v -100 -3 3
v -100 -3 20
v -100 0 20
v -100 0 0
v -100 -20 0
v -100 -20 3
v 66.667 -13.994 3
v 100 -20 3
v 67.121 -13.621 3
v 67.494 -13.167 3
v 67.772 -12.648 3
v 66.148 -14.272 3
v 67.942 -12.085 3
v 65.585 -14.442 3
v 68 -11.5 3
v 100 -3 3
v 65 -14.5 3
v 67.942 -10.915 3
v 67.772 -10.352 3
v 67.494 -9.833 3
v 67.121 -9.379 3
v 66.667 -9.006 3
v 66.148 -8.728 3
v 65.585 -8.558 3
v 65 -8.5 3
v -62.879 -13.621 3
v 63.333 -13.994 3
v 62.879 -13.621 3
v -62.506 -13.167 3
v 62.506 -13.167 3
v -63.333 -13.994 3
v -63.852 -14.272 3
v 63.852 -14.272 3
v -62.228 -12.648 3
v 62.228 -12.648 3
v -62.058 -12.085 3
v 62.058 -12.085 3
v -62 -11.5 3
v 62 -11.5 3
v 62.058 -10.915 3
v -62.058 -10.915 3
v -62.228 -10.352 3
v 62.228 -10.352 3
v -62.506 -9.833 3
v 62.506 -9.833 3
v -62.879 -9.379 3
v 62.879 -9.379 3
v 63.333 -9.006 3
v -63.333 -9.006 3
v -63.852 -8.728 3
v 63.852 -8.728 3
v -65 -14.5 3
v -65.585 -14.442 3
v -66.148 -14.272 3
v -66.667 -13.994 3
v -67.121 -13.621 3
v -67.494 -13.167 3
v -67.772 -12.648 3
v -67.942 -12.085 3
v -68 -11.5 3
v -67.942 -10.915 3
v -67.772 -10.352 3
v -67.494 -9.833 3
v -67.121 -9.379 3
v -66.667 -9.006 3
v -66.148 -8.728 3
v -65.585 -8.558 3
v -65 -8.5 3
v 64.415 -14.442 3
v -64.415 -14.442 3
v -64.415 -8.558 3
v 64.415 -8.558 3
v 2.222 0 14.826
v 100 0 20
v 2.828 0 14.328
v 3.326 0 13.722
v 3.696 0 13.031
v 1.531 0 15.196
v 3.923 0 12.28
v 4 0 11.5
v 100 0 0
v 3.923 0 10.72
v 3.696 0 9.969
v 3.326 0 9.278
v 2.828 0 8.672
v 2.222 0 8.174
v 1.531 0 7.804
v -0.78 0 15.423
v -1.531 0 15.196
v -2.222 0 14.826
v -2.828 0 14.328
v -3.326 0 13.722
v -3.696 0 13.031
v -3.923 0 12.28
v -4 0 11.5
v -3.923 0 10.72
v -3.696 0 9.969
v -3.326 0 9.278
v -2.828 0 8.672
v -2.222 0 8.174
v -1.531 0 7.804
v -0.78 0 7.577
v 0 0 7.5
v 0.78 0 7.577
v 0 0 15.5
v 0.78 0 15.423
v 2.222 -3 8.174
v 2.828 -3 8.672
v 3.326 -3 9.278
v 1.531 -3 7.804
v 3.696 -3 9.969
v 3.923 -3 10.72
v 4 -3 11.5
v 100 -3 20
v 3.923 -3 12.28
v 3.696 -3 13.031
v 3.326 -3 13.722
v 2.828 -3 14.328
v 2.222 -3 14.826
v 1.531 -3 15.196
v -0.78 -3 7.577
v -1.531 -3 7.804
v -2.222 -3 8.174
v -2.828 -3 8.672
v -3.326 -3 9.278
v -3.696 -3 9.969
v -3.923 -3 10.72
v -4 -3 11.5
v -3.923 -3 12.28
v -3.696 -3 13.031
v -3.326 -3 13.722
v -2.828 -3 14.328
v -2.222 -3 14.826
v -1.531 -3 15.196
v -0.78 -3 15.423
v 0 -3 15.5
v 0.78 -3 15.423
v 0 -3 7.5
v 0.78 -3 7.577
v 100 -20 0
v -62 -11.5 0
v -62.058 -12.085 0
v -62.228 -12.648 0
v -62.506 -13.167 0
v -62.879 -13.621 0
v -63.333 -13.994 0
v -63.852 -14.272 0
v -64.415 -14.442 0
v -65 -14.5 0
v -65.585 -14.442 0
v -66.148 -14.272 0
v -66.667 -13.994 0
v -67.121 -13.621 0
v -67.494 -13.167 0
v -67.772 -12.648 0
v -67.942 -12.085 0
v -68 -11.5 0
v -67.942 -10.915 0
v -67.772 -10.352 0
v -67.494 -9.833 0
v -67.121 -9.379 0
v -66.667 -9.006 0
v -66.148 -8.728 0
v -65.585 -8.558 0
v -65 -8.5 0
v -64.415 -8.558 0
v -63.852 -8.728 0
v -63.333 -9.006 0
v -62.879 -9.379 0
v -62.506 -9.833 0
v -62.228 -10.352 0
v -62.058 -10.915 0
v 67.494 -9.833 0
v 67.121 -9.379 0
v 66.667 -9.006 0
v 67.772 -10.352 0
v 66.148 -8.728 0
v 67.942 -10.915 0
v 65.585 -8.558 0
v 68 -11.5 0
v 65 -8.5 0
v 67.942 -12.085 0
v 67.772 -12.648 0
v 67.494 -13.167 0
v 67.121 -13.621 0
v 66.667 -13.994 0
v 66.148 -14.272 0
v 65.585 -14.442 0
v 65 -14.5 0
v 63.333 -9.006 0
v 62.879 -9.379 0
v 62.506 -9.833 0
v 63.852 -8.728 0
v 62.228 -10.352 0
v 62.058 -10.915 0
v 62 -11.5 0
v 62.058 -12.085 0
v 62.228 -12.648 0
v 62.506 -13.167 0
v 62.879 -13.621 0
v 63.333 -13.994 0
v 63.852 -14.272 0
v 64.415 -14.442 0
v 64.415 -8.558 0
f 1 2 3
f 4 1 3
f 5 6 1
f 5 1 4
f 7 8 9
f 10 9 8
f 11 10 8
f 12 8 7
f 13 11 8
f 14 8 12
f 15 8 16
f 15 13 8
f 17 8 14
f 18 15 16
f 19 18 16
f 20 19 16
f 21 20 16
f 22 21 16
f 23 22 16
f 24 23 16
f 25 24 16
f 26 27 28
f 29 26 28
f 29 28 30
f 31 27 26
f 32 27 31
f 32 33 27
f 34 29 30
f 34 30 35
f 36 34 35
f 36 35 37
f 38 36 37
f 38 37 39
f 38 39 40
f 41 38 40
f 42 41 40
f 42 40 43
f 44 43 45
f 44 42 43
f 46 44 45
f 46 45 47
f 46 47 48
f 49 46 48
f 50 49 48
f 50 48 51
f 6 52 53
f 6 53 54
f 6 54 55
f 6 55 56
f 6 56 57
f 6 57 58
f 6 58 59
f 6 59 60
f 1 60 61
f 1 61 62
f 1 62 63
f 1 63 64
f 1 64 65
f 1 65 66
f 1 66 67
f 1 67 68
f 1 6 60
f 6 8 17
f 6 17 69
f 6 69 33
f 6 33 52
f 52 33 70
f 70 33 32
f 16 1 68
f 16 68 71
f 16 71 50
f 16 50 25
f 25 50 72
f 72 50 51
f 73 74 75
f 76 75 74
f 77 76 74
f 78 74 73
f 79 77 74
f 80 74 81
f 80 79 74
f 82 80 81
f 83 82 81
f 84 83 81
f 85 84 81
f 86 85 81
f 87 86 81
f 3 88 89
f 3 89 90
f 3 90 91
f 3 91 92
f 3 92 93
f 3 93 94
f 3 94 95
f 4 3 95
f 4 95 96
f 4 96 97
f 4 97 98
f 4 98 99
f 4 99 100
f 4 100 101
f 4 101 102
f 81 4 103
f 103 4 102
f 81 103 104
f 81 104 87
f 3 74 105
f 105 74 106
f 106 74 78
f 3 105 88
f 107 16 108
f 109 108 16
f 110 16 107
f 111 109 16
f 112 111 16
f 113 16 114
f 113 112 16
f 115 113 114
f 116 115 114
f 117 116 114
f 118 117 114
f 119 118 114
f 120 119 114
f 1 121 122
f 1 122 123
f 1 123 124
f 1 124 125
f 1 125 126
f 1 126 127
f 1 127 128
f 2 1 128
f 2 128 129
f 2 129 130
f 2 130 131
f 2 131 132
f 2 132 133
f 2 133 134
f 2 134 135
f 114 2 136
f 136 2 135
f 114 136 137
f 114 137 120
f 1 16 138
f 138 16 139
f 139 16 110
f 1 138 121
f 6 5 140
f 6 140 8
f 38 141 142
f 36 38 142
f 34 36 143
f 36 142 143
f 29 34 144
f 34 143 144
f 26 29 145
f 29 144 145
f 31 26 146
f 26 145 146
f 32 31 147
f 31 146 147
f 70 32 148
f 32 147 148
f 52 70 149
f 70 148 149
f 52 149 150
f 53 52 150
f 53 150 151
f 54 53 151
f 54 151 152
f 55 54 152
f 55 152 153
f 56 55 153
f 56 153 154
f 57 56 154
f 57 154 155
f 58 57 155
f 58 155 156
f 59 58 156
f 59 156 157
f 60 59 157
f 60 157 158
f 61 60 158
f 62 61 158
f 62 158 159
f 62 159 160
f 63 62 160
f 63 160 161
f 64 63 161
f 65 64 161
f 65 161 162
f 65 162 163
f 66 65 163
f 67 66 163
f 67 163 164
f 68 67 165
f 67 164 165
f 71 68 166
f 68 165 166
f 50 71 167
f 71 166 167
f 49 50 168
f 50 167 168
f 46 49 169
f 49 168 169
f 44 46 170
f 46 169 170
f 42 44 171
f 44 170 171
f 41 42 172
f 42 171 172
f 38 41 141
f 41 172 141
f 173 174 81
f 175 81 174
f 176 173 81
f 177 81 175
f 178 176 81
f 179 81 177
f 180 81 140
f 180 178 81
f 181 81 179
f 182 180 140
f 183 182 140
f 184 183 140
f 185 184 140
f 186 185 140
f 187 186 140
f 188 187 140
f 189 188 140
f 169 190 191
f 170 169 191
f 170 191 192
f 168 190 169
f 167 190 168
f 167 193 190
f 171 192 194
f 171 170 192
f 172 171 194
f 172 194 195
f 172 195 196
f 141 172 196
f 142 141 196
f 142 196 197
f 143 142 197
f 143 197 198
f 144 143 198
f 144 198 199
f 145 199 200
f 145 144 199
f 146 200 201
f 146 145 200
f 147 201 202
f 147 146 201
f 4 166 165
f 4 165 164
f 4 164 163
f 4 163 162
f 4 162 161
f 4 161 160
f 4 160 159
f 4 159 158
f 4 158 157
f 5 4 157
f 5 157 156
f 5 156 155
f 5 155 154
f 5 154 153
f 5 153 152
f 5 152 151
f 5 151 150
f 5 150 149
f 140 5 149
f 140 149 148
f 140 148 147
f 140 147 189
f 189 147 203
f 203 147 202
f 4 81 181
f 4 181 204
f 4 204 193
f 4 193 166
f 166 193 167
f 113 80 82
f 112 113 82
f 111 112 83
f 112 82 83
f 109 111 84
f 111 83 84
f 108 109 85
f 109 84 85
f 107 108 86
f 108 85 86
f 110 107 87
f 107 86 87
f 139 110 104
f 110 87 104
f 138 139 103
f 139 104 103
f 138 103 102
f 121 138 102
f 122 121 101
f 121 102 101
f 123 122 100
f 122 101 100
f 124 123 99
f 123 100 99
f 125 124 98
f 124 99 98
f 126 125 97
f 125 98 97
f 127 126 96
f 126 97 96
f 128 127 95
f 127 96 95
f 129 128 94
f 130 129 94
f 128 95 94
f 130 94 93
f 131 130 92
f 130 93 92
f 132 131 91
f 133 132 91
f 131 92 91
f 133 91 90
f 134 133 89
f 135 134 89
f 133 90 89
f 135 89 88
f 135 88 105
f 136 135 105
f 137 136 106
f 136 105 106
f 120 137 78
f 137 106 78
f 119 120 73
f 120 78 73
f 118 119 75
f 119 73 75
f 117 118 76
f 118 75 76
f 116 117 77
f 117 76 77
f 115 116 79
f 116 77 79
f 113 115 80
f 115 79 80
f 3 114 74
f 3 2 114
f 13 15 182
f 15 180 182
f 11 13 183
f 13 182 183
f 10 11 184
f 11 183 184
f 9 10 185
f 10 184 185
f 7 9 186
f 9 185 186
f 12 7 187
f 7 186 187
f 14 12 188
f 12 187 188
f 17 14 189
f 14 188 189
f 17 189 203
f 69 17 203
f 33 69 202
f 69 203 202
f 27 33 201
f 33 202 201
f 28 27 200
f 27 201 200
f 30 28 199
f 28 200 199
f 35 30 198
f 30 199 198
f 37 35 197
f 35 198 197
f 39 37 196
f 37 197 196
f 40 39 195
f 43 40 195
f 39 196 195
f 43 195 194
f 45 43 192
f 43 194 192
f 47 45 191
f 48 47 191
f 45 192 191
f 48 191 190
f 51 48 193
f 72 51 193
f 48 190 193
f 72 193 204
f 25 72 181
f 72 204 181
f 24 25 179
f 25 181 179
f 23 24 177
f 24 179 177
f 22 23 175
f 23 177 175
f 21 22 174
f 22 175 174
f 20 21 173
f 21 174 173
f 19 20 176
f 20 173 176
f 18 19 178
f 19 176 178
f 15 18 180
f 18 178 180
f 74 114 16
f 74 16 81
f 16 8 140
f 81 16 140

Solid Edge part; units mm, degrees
sketch "Sketch1" plane through (0, 0, 0) normal (1, 0, 0) x (0, 1, 0)
  line L0 (0, 0) -> (-20, 0)
  line L1 (-20, 0) -> (-20, 3)
  line L2 (-20, 3) -> (-3, 3)
  line L3 (-3, 3) -> (-3, 20)
  line L4 (-3, 20) -> (0, 20)
  line L5 (0, 20) -> (0, 0)
extrude "Protrusion1" add sketch "Sketch1" along normal mid plane 200
sketch "Sketch2" plane through (0, 0, 0) normal (0, 0, 1) x (1, 0, 0)
  circle A0 centre (-65, -11.5) radius 3
  circle A1 centre (65, -11.5) radius 3
  dimension "D1" = 6
  dimension "D2" = 11.5
  dimension "D3" = 130
  dimension "D4" = 4
  dimension "D5" = 8
  dimension "D6" = 6
extrude "Cutout1" cut sketch "Sketch2" along normal up to next
sketch "Sketch3" plane through (0, 0, 0) normal (0, -1, 0) x (1, 0, 0)
  circle A0 centre (0, 11.5) radius 4
extrude "Cutout2" cut sketch "Sketch3" along normal up to next
